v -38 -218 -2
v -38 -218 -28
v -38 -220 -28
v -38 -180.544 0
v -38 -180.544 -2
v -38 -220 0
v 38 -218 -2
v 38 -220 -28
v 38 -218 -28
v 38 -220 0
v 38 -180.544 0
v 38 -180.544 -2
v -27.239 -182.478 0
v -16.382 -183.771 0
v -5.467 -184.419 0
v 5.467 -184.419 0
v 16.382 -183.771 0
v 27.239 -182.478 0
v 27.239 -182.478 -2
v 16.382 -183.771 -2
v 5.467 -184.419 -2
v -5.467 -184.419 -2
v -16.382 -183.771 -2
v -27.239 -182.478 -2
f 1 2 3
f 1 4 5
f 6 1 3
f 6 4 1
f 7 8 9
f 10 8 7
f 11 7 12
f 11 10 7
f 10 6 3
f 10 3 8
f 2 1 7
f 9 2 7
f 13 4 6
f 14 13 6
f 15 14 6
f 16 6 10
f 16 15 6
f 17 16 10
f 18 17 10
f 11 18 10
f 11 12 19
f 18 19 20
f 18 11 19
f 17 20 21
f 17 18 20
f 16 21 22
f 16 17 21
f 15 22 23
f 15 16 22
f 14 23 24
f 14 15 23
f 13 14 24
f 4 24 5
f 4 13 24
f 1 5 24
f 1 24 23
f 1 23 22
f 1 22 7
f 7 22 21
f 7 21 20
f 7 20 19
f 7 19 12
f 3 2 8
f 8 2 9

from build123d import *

# Parameters (mm, degrees)
BOSS_EXTRUDE1_DEPTH = 28
SHELL1_T            = -2


with BuildPart() as part:
    # Sketch1 → Boss-Extrude1 (new body)
    with BuildSketch(Plane.XY):
        with BuildLine():
            Line((38, -220), (38, -180.544315889))
            ThreePointArc((38, -180.544315889), (0, -184.5), (-38, -180.544315889))
            Line((-38, -180.544315889), (-38, -220))
            Line((-38, -220), (38, -220))
        make_face()
    extrude(amount=-BOSS_EXTRUDE1_DEPTH)

    # Shell1
    shell1_openings = [part.faces().sort_by_distance(p)[0] for p in [
        (38, -200.272157945, -14),
        (0, -184.5, -14),
        (0, -201.574740198, -28),
        (-38, -200.272157945, -14),
    ]]
    offset(amount=SHELL1_T, openings=shell1_openings, kind=Kind.INTERSECTION)


solid = part.part
